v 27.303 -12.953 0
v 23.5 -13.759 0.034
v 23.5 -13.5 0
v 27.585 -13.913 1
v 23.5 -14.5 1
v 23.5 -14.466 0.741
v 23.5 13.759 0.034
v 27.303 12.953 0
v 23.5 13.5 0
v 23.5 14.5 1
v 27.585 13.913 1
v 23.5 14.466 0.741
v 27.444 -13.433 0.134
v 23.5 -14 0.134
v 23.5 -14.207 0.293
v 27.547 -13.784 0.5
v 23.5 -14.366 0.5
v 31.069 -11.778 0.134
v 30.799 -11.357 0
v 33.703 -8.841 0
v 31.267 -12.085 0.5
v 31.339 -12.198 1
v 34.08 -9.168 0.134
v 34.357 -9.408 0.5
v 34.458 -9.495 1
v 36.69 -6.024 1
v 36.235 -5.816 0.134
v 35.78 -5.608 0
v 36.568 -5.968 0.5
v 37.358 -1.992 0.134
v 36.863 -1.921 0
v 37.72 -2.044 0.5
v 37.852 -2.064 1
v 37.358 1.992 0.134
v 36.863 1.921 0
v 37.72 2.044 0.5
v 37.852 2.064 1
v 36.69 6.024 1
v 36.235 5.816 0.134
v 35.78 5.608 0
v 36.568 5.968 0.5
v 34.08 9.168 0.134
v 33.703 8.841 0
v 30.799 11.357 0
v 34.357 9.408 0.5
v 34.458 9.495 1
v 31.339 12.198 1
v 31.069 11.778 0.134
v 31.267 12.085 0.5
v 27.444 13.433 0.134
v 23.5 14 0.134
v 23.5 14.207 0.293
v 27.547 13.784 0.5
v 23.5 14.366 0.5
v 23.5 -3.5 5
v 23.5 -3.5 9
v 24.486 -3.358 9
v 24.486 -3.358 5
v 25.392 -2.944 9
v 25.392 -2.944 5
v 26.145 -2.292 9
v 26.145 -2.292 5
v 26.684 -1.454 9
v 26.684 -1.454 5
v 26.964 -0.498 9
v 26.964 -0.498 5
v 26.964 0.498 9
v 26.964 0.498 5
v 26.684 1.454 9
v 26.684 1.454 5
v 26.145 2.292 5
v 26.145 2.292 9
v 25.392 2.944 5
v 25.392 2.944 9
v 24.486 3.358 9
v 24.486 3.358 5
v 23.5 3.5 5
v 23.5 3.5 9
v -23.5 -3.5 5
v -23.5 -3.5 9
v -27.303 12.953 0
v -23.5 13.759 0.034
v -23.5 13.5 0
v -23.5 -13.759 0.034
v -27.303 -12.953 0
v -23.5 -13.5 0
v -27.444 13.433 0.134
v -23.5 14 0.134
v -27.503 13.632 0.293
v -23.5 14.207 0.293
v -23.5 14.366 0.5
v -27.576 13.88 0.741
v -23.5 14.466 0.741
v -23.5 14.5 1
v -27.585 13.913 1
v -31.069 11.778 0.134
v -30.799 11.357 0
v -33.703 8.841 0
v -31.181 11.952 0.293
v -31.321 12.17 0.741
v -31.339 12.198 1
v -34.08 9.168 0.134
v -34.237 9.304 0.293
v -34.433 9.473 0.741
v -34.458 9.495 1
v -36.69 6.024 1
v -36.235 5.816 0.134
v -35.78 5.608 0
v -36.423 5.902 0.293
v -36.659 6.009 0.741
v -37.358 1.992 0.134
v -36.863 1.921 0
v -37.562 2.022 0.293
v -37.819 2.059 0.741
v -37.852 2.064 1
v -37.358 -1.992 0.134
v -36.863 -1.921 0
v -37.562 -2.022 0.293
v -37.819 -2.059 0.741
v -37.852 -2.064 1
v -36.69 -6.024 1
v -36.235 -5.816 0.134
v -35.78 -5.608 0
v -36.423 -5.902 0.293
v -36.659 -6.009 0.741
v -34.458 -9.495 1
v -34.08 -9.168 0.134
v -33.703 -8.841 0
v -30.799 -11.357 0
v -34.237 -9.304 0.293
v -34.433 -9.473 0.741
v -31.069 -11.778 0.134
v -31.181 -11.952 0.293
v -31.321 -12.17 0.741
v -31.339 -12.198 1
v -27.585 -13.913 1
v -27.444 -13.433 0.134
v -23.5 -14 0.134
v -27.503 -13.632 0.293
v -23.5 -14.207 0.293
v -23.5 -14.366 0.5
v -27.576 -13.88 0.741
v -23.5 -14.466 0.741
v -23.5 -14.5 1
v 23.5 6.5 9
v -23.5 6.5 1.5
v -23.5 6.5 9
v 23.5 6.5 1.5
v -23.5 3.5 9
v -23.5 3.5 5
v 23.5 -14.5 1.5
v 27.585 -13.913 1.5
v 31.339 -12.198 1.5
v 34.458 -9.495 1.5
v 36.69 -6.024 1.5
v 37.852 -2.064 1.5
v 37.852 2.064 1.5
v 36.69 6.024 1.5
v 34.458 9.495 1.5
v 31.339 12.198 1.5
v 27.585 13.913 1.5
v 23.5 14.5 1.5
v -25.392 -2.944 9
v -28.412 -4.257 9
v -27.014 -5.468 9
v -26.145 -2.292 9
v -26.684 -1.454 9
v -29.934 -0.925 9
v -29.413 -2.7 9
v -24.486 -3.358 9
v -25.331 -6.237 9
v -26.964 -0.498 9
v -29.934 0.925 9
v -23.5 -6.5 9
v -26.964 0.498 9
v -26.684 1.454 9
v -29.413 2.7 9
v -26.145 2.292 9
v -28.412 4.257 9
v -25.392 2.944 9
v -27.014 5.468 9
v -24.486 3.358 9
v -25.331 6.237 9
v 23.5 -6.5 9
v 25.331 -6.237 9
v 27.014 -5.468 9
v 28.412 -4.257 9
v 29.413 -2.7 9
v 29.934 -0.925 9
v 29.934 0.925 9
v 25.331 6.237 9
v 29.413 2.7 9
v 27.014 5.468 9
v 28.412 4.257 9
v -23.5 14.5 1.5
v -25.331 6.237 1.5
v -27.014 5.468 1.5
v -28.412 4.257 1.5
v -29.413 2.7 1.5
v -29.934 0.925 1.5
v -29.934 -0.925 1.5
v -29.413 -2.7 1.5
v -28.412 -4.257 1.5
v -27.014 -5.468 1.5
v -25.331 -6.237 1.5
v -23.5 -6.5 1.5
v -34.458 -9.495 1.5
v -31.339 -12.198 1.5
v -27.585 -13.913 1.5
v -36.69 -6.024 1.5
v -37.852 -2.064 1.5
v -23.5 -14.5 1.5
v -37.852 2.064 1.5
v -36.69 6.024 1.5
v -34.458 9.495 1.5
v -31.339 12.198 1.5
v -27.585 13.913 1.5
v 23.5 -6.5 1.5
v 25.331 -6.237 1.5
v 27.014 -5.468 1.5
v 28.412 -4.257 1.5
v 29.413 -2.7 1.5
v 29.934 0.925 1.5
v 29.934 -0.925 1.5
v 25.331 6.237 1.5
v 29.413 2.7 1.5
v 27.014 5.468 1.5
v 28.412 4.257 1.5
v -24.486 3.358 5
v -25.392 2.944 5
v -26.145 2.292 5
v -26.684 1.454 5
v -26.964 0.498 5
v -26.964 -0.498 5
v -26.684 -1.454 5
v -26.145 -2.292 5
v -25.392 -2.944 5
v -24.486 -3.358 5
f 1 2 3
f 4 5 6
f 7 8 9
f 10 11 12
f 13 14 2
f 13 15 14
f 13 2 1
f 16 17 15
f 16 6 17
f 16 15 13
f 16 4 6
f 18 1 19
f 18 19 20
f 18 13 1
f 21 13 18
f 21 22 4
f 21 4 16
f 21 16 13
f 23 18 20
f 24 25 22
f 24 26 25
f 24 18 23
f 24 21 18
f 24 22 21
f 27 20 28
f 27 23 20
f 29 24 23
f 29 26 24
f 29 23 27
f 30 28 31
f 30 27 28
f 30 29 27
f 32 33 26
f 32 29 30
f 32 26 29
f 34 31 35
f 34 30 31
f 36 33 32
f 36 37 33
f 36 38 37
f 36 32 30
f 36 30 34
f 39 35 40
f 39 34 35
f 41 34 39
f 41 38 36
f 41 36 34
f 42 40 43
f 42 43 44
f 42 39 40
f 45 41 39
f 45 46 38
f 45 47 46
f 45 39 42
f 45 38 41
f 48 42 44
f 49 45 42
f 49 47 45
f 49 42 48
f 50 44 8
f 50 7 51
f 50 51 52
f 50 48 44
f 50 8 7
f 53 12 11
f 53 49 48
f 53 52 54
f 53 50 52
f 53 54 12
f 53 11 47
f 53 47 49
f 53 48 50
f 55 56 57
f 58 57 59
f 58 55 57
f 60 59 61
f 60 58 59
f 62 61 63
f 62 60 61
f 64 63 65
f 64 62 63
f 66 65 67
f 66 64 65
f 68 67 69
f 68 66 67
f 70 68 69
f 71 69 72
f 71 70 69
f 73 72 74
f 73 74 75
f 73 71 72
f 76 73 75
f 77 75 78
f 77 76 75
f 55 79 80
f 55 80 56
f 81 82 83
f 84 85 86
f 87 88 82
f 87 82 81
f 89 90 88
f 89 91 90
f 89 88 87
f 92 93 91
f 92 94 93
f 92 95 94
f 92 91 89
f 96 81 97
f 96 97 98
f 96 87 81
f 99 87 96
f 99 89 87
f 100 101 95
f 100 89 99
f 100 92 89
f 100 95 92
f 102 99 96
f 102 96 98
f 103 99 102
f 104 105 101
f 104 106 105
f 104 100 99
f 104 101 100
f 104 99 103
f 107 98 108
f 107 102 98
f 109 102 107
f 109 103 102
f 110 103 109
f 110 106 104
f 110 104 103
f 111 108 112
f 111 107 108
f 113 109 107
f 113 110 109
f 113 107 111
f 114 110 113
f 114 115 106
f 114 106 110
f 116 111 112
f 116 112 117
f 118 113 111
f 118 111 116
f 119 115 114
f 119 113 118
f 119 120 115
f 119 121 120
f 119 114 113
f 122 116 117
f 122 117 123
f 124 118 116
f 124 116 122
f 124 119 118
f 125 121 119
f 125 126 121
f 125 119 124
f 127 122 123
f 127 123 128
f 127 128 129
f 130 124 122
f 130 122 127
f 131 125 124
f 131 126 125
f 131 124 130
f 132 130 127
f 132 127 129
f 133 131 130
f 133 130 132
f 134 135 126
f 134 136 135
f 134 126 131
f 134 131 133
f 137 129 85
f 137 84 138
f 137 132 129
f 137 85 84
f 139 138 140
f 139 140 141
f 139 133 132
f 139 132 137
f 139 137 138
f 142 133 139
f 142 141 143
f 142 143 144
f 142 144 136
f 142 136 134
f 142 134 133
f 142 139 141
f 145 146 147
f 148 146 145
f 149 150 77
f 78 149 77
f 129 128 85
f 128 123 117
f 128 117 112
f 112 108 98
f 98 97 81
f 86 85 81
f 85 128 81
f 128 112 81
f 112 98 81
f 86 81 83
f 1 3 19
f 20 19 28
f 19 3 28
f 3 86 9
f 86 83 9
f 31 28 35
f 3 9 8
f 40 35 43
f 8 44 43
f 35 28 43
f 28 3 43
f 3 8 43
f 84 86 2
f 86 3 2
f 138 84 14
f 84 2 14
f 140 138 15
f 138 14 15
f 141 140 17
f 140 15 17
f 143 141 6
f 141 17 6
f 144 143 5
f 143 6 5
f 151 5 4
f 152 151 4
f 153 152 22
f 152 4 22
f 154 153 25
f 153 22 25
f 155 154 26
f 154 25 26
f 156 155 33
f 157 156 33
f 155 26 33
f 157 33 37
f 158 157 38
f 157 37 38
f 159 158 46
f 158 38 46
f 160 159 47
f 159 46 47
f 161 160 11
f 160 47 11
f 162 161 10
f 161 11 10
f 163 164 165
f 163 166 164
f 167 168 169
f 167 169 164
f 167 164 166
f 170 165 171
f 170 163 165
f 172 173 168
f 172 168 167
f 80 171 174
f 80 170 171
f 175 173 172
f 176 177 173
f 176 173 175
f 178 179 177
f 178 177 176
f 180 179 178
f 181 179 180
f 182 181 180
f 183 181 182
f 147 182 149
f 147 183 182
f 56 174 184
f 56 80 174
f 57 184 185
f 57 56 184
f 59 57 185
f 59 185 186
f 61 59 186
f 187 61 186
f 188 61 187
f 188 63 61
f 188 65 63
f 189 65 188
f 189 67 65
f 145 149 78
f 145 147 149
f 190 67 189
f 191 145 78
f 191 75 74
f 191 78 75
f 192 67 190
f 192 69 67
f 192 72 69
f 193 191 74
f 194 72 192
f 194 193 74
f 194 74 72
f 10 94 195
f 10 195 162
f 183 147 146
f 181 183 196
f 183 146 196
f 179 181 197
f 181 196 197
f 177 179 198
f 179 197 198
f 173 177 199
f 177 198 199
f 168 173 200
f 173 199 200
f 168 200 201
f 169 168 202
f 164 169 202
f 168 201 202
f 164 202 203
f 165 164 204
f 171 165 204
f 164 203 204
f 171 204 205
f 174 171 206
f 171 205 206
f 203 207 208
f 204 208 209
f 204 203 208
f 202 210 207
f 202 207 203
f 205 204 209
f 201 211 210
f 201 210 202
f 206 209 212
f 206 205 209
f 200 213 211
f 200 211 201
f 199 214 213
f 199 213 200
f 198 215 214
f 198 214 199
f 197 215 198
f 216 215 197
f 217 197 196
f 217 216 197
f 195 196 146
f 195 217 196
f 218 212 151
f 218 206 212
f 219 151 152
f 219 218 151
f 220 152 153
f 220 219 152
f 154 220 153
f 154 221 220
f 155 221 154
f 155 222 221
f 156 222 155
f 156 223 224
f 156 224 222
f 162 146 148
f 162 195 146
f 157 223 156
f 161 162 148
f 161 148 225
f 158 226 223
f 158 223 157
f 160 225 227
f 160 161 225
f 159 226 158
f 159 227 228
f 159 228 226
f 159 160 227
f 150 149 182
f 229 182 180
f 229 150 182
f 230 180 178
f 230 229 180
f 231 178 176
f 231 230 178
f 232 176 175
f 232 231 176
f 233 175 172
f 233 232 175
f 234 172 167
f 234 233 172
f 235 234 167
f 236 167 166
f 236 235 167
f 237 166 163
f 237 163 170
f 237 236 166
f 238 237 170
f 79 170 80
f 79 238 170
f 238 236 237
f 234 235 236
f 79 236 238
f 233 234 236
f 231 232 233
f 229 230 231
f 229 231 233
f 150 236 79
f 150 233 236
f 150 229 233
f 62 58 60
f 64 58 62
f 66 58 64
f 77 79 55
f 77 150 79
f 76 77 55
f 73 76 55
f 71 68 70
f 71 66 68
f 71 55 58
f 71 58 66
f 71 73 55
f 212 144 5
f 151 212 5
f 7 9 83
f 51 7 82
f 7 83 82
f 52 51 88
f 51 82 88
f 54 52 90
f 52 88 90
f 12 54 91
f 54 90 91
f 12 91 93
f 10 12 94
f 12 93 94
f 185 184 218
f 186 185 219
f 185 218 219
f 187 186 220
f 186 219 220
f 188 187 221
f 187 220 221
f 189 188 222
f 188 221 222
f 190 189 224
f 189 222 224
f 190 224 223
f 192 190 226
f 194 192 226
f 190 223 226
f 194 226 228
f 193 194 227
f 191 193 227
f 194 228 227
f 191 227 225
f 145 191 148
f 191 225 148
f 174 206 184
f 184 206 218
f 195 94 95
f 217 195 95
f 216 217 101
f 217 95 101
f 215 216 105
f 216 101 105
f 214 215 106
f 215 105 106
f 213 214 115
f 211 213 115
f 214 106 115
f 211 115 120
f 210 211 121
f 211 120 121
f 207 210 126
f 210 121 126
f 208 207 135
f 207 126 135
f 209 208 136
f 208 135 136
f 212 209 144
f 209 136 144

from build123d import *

# Parameters (mm, degrees)
F0_W     = 47
F0_H     = 29
F1_DEPTH = 1.5
F2_W     = 47
F2_H     = 13
F3_DEPTH = 9
F4_T     = -3
F5_R     = 1
F6_DEPTH = 2


with BuildPart() as f1:
    # F0 (on Top) → F1 (new body)
    with BuildSketch(Plane.XY):
        Rectangle(F0_W, F0_H)
        with BuildLine():
            Line((23.5, 14.5), (23.5, -14.5))
            ThreePointArc((23.5, -14.5), (38, 0), (23.5, 14.5))
        make_face()
        with BuildLine():
            ThreePointArc((-23.5, 14.5), (-38, 0), (-23.5, -14.5))
            Line((-23.5, -14.5), (-23.5, 14.5))
        make_face()
    extrude(amount=F1_DEPTH)

    # F2 (on face) → F3 (join)
    with BuildSketch(Plane.XY):
        Rectangle(F2_W, F2_H)
        with BuildLine():
            Line((23.5, 6.5), (23.5, -6.5))
            ThreePointArc((23.5, -6.5), (30, 0), (23.5, 6.5))
        make_face()
        with BuildLine():
            ThreePointArc((-23.5, 6.5), (-30, 0), (-23.5, -6.5))
            Line((-23.5, -6.5), (-23.5, 6.5))
        make_face()
    extrude(amount=F3_DEPTH)

    # F4
    f4_openings = [f1.faces().sort_by_distance(p)[0] for p in [
        (0, 0, 9),
    ]]
    offset(amount=F4_T, openings=f4_openings)

    # F5
    f5_edges = [f1.edges().sort_by_distance(p)[0] for p in [
        (38, 0, 0),
        (0, -14.5, 0),
        (-38, 0, 0),
        (0, 14.5, 0),
    ]]
    fillet(f5_edges, radius=F5_R)

    # F6 (add): a face of the model
    f6_faces = [f1.faces().sort_by_distance(p)[0] for p in [
        (0, 0, 3),
    ]]
    extrude(f6_faces, amount=F6_DEPTH)


solid = f1.part
